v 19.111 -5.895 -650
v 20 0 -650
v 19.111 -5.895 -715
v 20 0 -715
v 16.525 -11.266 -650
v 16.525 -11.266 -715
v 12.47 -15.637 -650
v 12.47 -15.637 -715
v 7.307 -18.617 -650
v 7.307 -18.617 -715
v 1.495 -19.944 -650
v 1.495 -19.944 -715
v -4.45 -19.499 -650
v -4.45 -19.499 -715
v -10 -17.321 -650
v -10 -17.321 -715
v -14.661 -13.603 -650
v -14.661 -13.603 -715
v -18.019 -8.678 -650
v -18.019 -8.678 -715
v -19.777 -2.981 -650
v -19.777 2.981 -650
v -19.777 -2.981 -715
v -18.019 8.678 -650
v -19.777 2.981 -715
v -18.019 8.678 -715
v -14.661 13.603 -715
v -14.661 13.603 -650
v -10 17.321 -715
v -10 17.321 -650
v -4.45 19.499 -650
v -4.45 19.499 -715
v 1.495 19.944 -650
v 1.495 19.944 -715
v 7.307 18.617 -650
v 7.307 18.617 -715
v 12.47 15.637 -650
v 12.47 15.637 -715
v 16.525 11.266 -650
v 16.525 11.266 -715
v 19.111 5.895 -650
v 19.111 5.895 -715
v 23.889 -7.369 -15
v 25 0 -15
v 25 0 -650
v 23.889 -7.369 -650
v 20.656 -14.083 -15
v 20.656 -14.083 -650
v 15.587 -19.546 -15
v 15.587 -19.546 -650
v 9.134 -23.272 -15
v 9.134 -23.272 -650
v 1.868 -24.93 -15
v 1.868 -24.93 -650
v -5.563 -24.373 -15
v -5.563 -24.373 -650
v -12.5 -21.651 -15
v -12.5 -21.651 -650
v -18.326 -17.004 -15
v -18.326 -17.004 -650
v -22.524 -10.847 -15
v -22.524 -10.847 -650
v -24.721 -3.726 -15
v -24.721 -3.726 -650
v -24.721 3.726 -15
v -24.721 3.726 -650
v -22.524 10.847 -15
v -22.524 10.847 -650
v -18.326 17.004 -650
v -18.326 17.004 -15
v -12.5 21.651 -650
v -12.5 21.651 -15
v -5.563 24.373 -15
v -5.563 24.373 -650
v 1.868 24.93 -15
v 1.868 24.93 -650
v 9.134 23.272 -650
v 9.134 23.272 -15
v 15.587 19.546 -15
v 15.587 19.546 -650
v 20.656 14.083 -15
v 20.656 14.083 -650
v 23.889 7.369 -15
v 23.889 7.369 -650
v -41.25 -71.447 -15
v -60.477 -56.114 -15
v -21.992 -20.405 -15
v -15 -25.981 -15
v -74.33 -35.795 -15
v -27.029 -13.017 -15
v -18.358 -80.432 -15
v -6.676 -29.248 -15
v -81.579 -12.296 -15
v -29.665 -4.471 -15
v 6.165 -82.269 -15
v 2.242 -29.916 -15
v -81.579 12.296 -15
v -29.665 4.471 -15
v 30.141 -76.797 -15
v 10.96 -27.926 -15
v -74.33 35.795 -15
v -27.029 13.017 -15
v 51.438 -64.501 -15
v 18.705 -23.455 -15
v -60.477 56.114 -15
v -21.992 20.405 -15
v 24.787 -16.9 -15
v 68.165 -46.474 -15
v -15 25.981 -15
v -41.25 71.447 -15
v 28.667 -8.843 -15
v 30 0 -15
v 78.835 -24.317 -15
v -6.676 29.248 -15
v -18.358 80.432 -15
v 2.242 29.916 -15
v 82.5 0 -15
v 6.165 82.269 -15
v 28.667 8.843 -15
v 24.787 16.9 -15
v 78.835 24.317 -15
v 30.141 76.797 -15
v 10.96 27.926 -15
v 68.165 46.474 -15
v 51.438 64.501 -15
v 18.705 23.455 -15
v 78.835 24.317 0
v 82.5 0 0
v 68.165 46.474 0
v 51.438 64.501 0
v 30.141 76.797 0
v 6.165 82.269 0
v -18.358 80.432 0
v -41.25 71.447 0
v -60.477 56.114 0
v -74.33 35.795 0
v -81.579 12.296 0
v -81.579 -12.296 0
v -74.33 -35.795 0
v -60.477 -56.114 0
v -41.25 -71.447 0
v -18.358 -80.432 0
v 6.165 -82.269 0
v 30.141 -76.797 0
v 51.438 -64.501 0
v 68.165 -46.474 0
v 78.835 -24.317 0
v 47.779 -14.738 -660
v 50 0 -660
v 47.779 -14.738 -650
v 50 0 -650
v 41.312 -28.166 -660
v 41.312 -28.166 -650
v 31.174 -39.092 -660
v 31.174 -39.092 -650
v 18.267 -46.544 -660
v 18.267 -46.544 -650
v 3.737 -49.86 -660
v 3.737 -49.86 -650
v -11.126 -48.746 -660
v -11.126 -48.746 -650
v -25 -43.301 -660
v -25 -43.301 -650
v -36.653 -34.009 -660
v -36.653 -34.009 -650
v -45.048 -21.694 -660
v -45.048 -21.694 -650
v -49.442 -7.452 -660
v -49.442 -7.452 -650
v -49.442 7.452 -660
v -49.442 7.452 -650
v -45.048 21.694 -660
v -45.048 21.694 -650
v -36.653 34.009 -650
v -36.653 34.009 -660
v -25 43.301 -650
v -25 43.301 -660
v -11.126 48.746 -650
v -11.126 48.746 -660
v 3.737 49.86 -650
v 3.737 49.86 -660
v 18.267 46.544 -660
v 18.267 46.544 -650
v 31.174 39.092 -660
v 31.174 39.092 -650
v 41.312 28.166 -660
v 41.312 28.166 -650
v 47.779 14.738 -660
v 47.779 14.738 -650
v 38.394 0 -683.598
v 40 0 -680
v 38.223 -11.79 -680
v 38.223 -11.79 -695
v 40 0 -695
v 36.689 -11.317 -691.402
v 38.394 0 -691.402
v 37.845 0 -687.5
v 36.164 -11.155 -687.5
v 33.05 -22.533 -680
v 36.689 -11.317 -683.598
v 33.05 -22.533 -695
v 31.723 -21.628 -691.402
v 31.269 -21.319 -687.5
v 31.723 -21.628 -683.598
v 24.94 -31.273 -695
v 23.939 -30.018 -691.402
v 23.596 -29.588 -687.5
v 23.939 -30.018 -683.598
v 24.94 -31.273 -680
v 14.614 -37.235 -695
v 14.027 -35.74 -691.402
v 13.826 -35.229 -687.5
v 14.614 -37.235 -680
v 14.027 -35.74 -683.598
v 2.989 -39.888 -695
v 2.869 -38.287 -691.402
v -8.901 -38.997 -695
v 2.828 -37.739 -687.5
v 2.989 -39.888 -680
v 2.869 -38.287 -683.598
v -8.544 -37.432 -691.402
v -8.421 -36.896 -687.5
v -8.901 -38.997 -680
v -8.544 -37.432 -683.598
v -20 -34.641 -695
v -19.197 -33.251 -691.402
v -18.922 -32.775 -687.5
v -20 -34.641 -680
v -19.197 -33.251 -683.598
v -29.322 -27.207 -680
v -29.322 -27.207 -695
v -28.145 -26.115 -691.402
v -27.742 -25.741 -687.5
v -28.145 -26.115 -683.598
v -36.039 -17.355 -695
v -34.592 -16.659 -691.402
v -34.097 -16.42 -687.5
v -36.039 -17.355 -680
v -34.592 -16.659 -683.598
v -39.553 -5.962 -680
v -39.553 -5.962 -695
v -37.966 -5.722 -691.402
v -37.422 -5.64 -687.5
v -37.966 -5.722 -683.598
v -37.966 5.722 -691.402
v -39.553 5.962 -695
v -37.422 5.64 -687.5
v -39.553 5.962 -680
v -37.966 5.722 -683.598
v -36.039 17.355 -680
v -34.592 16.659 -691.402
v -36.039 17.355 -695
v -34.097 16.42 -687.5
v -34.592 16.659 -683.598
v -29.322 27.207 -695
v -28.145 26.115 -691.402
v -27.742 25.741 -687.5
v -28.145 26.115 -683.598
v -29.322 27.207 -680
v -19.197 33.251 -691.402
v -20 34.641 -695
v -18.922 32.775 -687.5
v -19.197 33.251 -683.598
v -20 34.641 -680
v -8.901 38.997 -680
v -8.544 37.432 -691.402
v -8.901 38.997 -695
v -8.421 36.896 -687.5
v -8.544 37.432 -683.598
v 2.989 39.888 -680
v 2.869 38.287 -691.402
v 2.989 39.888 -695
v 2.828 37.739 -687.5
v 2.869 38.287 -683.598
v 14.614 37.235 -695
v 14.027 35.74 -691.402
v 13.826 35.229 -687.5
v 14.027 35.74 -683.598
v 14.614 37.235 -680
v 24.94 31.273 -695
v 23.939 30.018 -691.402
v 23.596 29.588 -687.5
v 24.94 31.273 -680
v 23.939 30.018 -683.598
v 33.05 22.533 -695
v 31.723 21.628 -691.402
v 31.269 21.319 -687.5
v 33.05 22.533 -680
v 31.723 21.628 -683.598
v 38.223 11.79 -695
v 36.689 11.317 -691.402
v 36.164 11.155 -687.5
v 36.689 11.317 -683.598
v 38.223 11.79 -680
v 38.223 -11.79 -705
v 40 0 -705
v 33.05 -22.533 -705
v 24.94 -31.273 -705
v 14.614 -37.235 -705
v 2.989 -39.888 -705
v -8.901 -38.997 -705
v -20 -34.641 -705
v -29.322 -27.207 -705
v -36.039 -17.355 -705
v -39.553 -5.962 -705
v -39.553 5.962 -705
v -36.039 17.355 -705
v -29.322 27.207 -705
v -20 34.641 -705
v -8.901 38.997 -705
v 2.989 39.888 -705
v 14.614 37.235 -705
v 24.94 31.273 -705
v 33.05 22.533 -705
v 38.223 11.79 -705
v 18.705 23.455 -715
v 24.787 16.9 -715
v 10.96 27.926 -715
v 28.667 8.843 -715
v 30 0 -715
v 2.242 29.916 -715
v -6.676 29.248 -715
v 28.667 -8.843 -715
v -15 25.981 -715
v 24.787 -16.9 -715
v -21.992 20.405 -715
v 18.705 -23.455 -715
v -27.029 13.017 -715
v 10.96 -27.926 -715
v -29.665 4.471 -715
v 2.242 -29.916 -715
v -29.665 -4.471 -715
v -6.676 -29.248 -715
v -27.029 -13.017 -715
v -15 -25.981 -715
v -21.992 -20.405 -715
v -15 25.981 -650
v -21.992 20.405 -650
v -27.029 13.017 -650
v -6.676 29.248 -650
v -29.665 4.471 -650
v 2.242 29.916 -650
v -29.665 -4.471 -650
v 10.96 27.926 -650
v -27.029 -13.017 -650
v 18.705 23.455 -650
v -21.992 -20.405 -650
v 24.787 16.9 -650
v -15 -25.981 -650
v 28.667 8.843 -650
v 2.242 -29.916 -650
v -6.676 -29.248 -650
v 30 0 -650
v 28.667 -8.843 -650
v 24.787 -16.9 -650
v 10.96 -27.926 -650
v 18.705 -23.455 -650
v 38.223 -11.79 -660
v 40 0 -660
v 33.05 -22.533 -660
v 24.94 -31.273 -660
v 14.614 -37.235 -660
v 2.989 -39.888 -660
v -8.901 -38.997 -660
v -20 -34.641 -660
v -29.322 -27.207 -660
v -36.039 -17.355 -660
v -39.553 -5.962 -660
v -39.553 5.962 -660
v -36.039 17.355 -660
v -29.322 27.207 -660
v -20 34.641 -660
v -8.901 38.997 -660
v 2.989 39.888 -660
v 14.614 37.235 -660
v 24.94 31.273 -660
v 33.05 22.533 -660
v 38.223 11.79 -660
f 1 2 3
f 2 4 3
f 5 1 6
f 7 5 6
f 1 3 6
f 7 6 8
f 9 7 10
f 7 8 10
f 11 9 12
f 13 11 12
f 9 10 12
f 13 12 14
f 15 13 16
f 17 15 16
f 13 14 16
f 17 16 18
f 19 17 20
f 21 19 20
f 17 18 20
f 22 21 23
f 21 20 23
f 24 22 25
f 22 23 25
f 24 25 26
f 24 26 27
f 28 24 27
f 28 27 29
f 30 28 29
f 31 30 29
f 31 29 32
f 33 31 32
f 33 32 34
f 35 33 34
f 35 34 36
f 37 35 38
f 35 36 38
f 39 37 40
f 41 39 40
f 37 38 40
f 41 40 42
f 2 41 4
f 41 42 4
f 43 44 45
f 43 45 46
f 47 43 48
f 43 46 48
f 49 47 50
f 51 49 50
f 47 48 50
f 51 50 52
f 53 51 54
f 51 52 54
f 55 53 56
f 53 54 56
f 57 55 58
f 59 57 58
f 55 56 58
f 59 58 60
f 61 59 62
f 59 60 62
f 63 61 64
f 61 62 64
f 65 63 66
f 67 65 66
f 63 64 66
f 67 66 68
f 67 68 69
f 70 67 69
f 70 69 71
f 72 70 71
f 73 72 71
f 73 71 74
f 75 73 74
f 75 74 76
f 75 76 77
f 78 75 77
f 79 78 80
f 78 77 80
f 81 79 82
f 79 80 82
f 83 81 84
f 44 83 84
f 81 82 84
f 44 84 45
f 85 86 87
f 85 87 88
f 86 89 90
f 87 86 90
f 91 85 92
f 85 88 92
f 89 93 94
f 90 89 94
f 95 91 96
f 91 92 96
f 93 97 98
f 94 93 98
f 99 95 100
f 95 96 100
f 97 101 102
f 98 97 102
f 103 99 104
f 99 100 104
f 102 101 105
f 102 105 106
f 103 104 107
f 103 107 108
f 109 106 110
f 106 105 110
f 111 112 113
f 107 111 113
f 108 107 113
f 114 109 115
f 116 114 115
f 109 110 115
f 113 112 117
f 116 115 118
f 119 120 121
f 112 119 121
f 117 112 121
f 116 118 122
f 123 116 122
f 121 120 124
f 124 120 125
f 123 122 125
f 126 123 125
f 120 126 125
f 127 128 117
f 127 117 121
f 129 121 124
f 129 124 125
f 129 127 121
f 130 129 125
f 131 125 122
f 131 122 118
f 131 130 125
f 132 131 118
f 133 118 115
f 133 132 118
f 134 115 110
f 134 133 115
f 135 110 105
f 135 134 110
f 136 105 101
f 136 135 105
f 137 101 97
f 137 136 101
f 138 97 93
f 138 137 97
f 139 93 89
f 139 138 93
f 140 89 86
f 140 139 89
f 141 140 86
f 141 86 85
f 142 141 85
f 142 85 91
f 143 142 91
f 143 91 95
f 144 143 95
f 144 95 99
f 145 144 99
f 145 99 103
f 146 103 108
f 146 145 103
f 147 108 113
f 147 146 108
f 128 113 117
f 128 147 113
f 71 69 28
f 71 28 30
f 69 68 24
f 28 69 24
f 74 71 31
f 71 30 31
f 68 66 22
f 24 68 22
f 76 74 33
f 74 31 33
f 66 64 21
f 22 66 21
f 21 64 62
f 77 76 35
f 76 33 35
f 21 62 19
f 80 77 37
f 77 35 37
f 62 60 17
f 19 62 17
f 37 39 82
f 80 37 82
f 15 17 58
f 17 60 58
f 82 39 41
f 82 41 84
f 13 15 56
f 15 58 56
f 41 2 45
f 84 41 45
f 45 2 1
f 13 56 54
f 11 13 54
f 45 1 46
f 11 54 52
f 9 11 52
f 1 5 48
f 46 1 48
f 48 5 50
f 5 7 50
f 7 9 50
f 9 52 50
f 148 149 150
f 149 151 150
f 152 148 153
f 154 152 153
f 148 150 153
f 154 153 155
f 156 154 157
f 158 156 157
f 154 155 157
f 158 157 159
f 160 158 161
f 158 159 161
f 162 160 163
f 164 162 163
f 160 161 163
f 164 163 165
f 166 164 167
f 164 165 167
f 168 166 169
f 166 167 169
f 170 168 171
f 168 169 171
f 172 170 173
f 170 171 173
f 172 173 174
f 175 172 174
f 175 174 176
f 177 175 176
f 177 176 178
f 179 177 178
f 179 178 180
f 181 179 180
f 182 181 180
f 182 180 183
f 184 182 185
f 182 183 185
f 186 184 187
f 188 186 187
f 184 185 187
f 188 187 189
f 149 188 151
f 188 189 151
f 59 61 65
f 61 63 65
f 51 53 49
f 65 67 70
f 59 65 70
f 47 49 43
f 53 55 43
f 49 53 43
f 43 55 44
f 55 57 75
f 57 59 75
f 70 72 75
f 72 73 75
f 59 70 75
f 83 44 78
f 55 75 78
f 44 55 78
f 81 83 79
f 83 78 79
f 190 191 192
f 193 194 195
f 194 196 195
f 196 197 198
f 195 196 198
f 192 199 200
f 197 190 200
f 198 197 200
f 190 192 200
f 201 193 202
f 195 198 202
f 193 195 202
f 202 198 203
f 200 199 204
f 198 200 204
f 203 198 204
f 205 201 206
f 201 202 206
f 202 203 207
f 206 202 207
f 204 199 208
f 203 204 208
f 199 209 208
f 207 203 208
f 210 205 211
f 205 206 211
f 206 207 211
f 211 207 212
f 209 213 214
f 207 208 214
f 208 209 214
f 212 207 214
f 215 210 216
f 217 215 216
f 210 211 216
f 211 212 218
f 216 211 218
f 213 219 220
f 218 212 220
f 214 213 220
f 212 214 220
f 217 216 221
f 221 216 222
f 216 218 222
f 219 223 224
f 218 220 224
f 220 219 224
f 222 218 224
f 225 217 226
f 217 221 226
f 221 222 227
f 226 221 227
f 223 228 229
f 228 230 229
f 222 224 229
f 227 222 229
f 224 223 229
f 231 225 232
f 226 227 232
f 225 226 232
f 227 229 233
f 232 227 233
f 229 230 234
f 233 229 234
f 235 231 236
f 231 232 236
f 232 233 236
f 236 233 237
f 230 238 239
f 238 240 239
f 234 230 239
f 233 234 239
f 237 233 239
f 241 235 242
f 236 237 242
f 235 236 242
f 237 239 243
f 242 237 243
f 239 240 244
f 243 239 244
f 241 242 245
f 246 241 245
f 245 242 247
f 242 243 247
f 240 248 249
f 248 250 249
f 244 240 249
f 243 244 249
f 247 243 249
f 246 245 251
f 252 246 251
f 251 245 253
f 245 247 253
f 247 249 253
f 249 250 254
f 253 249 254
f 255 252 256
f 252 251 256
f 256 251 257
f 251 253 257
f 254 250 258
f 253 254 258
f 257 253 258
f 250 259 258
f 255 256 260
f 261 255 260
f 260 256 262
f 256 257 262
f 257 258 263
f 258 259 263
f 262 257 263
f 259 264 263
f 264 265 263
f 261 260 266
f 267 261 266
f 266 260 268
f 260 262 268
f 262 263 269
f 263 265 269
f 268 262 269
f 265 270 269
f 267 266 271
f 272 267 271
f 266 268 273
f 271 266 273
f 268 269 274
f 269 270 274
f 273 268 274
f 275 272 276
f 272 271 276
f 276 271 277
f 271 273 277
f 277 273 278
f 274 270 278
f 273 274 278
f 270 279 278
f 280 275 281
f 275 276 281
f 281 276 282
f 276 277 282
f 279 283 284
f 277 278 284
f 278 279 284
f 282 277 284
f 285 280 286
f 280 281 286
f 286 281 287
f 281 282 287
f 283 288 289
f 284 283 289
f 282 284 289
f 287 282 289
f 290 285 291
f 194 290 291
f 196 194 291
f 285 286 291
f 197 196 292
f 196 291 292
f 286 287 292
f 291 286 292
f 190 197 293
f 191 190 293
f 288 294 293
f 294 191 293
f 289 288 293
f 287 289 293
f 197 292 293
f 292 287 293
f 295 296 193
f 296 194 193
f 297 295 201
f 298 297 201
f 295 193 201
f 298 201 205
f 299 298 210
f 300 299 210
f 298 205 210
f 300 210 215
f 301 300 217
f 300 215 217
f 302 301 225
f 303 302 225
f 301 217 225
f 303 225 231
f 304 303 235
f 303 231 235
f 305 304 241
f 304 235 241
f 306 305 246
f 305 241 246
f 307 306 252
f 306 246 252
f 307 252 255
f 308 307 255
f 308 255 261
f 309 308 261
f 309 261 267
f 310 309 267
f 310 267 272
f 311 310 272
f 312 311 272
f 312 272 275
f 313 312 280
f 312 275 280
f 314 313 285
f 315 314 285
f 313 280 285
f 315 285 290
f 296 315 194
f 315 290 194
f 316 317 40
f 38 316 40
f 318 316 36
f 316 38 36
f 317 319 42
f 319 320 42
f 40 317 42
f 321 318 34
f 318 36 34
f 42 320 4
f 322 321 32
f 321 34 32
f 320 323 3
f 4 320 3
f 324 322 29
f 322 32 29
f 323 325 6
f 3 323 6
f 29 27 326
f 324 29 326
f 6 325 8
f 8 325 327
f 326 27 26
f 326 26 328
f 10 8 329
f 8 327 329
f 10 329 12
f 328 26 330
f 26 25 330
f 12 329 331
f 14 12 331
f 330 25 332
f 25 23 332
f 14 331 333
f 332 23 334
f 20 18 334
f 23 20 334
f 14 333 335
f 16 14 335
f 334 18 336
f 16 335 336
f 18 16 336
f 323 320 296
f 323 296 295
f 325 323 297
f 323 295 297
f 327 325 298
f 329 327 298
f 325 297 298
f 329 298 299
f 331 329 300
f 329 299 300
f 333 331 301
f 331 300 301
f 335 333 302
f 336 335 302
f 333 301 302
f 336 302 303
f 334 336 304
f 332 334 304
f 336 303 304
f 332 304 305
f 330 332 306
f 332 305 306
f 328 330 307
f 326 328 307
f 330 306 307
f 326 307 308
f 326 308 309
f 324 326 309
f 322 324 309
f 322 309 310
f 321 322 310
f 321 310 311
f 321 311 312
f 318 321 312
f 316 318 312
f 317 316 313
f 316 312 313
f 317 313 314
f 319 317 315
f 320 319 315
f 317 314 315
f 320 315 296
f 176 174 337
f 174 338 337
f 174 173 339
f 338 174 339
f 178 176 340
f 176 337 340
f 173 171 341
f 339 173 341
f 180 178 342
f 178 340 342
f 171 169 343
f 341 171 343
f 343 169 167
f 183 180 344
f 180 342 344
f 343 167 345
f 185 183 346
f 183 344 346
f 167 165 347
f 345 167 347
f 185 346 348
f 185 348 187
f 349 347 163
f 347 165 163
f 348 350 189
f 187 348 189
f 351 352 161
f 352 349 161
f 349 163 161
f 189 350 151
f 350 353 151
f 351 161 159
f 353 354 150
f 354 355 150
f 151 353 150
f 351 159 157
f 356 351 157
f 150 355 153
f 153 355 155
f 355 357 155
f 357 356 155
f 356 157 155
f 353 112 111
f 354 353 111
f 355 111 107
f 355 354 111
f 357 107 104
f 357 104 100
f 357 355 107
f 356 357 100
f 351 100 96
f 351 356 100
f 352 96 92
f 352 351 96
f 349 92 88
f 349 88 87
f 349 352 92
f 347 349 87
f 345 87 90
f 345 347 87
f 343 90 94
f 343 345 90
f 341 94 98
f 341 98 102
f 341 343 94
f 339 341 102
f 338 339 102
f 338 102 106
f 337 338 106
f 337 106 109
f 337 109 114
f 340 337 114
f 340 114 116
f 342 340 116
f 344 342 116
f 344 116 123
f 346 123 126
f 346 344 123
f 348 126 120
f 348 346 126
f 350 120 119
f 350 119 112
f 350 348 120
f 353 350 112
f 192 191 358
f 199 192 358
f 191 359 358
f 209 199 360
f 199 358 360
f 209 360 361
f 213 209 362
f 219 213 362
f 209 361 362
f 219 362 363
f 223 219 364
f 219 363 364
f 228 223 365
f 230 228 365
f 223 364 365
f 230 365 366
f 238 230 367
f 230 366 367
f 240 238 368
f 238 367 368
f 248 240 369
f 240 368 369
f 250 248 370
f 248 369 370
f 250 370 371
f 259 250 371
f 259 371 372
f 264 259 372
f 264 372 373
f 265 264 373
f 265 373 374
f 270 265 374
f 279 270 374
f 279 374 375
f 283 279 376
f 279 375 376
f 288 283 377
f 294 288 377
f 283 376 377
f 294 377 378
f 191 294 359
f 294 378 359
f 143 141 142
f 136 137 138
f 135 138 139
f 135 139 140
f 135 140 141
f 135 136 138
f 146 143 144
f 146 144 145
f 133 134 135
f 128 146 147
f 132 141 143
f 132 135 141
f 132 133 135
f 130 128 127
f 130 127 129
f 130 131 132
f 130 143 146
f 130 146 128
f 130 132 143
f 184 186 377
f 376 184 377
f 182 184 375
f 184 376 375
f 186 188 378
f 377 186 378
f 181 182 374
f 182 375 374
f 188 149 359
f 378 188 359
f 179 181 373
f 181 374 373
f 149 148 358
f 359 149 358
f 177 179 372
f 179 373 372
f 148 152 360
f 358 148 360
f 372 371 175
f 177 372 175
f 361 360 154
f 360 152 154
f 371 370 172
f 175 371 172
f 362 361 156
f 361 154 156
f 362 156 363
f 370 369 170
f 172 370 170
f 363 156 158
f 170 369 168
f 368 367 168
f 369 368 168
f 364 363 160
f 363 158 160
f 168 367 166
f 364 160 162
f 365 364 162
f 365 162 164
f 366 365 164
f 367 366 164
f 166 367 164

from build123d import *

# Parameters (mm, degrees)
F1_R     = 30
F1_R_2   = 25
F3_R     = 82.5
F4_DEPTH = 15


with BuildPart() as f2:
    # F2: sweep along a path in F0
    with BuildLine(Plane.YZ) as f2_path:
        Line((0, 0), (0, -50))
        Line((0, -50), (0, -650))
    # F1 (on Top) → F2 (sweep)
    with BuildSketch(Plane.XY):
        Circle(F1_R)
        Circle(F1_R_2, mode=Mode.SUBTRACT)
    sweep(path=f2_path.line)

    # F3 (on Top) → F4 (join)
    with BuildSketch(Plane.XY):
        Circle(F3_R)
    extrude(amount=-F4_DEPTH)

    # F5 (on Front) → F6 (revolve)
    with BuildSketch(Plane.XZ):
        with BuildLine():
            Line((50, -650), (35, -650))
            Line((35, -650), (30, -650))
            Line((30, -650), (20, -650))
            Line((20, -650), (20, -715))
            Line((20, -715), (30, -715))
            Line((30, -715), (40, -705))
            Line((40, -705), (40, -695))
            ThreePointArc((40, -695), (37.844933, -687.5), (40, -680))
            Line((40, -680), (40, -660))
            Line((40, -660), (50, -660))
            Line((50, -660), (50, -650))
        make_face()
    revolve(axis=Axis((0, 0, 0), (0, 0, -1)))


solid = f2.part
